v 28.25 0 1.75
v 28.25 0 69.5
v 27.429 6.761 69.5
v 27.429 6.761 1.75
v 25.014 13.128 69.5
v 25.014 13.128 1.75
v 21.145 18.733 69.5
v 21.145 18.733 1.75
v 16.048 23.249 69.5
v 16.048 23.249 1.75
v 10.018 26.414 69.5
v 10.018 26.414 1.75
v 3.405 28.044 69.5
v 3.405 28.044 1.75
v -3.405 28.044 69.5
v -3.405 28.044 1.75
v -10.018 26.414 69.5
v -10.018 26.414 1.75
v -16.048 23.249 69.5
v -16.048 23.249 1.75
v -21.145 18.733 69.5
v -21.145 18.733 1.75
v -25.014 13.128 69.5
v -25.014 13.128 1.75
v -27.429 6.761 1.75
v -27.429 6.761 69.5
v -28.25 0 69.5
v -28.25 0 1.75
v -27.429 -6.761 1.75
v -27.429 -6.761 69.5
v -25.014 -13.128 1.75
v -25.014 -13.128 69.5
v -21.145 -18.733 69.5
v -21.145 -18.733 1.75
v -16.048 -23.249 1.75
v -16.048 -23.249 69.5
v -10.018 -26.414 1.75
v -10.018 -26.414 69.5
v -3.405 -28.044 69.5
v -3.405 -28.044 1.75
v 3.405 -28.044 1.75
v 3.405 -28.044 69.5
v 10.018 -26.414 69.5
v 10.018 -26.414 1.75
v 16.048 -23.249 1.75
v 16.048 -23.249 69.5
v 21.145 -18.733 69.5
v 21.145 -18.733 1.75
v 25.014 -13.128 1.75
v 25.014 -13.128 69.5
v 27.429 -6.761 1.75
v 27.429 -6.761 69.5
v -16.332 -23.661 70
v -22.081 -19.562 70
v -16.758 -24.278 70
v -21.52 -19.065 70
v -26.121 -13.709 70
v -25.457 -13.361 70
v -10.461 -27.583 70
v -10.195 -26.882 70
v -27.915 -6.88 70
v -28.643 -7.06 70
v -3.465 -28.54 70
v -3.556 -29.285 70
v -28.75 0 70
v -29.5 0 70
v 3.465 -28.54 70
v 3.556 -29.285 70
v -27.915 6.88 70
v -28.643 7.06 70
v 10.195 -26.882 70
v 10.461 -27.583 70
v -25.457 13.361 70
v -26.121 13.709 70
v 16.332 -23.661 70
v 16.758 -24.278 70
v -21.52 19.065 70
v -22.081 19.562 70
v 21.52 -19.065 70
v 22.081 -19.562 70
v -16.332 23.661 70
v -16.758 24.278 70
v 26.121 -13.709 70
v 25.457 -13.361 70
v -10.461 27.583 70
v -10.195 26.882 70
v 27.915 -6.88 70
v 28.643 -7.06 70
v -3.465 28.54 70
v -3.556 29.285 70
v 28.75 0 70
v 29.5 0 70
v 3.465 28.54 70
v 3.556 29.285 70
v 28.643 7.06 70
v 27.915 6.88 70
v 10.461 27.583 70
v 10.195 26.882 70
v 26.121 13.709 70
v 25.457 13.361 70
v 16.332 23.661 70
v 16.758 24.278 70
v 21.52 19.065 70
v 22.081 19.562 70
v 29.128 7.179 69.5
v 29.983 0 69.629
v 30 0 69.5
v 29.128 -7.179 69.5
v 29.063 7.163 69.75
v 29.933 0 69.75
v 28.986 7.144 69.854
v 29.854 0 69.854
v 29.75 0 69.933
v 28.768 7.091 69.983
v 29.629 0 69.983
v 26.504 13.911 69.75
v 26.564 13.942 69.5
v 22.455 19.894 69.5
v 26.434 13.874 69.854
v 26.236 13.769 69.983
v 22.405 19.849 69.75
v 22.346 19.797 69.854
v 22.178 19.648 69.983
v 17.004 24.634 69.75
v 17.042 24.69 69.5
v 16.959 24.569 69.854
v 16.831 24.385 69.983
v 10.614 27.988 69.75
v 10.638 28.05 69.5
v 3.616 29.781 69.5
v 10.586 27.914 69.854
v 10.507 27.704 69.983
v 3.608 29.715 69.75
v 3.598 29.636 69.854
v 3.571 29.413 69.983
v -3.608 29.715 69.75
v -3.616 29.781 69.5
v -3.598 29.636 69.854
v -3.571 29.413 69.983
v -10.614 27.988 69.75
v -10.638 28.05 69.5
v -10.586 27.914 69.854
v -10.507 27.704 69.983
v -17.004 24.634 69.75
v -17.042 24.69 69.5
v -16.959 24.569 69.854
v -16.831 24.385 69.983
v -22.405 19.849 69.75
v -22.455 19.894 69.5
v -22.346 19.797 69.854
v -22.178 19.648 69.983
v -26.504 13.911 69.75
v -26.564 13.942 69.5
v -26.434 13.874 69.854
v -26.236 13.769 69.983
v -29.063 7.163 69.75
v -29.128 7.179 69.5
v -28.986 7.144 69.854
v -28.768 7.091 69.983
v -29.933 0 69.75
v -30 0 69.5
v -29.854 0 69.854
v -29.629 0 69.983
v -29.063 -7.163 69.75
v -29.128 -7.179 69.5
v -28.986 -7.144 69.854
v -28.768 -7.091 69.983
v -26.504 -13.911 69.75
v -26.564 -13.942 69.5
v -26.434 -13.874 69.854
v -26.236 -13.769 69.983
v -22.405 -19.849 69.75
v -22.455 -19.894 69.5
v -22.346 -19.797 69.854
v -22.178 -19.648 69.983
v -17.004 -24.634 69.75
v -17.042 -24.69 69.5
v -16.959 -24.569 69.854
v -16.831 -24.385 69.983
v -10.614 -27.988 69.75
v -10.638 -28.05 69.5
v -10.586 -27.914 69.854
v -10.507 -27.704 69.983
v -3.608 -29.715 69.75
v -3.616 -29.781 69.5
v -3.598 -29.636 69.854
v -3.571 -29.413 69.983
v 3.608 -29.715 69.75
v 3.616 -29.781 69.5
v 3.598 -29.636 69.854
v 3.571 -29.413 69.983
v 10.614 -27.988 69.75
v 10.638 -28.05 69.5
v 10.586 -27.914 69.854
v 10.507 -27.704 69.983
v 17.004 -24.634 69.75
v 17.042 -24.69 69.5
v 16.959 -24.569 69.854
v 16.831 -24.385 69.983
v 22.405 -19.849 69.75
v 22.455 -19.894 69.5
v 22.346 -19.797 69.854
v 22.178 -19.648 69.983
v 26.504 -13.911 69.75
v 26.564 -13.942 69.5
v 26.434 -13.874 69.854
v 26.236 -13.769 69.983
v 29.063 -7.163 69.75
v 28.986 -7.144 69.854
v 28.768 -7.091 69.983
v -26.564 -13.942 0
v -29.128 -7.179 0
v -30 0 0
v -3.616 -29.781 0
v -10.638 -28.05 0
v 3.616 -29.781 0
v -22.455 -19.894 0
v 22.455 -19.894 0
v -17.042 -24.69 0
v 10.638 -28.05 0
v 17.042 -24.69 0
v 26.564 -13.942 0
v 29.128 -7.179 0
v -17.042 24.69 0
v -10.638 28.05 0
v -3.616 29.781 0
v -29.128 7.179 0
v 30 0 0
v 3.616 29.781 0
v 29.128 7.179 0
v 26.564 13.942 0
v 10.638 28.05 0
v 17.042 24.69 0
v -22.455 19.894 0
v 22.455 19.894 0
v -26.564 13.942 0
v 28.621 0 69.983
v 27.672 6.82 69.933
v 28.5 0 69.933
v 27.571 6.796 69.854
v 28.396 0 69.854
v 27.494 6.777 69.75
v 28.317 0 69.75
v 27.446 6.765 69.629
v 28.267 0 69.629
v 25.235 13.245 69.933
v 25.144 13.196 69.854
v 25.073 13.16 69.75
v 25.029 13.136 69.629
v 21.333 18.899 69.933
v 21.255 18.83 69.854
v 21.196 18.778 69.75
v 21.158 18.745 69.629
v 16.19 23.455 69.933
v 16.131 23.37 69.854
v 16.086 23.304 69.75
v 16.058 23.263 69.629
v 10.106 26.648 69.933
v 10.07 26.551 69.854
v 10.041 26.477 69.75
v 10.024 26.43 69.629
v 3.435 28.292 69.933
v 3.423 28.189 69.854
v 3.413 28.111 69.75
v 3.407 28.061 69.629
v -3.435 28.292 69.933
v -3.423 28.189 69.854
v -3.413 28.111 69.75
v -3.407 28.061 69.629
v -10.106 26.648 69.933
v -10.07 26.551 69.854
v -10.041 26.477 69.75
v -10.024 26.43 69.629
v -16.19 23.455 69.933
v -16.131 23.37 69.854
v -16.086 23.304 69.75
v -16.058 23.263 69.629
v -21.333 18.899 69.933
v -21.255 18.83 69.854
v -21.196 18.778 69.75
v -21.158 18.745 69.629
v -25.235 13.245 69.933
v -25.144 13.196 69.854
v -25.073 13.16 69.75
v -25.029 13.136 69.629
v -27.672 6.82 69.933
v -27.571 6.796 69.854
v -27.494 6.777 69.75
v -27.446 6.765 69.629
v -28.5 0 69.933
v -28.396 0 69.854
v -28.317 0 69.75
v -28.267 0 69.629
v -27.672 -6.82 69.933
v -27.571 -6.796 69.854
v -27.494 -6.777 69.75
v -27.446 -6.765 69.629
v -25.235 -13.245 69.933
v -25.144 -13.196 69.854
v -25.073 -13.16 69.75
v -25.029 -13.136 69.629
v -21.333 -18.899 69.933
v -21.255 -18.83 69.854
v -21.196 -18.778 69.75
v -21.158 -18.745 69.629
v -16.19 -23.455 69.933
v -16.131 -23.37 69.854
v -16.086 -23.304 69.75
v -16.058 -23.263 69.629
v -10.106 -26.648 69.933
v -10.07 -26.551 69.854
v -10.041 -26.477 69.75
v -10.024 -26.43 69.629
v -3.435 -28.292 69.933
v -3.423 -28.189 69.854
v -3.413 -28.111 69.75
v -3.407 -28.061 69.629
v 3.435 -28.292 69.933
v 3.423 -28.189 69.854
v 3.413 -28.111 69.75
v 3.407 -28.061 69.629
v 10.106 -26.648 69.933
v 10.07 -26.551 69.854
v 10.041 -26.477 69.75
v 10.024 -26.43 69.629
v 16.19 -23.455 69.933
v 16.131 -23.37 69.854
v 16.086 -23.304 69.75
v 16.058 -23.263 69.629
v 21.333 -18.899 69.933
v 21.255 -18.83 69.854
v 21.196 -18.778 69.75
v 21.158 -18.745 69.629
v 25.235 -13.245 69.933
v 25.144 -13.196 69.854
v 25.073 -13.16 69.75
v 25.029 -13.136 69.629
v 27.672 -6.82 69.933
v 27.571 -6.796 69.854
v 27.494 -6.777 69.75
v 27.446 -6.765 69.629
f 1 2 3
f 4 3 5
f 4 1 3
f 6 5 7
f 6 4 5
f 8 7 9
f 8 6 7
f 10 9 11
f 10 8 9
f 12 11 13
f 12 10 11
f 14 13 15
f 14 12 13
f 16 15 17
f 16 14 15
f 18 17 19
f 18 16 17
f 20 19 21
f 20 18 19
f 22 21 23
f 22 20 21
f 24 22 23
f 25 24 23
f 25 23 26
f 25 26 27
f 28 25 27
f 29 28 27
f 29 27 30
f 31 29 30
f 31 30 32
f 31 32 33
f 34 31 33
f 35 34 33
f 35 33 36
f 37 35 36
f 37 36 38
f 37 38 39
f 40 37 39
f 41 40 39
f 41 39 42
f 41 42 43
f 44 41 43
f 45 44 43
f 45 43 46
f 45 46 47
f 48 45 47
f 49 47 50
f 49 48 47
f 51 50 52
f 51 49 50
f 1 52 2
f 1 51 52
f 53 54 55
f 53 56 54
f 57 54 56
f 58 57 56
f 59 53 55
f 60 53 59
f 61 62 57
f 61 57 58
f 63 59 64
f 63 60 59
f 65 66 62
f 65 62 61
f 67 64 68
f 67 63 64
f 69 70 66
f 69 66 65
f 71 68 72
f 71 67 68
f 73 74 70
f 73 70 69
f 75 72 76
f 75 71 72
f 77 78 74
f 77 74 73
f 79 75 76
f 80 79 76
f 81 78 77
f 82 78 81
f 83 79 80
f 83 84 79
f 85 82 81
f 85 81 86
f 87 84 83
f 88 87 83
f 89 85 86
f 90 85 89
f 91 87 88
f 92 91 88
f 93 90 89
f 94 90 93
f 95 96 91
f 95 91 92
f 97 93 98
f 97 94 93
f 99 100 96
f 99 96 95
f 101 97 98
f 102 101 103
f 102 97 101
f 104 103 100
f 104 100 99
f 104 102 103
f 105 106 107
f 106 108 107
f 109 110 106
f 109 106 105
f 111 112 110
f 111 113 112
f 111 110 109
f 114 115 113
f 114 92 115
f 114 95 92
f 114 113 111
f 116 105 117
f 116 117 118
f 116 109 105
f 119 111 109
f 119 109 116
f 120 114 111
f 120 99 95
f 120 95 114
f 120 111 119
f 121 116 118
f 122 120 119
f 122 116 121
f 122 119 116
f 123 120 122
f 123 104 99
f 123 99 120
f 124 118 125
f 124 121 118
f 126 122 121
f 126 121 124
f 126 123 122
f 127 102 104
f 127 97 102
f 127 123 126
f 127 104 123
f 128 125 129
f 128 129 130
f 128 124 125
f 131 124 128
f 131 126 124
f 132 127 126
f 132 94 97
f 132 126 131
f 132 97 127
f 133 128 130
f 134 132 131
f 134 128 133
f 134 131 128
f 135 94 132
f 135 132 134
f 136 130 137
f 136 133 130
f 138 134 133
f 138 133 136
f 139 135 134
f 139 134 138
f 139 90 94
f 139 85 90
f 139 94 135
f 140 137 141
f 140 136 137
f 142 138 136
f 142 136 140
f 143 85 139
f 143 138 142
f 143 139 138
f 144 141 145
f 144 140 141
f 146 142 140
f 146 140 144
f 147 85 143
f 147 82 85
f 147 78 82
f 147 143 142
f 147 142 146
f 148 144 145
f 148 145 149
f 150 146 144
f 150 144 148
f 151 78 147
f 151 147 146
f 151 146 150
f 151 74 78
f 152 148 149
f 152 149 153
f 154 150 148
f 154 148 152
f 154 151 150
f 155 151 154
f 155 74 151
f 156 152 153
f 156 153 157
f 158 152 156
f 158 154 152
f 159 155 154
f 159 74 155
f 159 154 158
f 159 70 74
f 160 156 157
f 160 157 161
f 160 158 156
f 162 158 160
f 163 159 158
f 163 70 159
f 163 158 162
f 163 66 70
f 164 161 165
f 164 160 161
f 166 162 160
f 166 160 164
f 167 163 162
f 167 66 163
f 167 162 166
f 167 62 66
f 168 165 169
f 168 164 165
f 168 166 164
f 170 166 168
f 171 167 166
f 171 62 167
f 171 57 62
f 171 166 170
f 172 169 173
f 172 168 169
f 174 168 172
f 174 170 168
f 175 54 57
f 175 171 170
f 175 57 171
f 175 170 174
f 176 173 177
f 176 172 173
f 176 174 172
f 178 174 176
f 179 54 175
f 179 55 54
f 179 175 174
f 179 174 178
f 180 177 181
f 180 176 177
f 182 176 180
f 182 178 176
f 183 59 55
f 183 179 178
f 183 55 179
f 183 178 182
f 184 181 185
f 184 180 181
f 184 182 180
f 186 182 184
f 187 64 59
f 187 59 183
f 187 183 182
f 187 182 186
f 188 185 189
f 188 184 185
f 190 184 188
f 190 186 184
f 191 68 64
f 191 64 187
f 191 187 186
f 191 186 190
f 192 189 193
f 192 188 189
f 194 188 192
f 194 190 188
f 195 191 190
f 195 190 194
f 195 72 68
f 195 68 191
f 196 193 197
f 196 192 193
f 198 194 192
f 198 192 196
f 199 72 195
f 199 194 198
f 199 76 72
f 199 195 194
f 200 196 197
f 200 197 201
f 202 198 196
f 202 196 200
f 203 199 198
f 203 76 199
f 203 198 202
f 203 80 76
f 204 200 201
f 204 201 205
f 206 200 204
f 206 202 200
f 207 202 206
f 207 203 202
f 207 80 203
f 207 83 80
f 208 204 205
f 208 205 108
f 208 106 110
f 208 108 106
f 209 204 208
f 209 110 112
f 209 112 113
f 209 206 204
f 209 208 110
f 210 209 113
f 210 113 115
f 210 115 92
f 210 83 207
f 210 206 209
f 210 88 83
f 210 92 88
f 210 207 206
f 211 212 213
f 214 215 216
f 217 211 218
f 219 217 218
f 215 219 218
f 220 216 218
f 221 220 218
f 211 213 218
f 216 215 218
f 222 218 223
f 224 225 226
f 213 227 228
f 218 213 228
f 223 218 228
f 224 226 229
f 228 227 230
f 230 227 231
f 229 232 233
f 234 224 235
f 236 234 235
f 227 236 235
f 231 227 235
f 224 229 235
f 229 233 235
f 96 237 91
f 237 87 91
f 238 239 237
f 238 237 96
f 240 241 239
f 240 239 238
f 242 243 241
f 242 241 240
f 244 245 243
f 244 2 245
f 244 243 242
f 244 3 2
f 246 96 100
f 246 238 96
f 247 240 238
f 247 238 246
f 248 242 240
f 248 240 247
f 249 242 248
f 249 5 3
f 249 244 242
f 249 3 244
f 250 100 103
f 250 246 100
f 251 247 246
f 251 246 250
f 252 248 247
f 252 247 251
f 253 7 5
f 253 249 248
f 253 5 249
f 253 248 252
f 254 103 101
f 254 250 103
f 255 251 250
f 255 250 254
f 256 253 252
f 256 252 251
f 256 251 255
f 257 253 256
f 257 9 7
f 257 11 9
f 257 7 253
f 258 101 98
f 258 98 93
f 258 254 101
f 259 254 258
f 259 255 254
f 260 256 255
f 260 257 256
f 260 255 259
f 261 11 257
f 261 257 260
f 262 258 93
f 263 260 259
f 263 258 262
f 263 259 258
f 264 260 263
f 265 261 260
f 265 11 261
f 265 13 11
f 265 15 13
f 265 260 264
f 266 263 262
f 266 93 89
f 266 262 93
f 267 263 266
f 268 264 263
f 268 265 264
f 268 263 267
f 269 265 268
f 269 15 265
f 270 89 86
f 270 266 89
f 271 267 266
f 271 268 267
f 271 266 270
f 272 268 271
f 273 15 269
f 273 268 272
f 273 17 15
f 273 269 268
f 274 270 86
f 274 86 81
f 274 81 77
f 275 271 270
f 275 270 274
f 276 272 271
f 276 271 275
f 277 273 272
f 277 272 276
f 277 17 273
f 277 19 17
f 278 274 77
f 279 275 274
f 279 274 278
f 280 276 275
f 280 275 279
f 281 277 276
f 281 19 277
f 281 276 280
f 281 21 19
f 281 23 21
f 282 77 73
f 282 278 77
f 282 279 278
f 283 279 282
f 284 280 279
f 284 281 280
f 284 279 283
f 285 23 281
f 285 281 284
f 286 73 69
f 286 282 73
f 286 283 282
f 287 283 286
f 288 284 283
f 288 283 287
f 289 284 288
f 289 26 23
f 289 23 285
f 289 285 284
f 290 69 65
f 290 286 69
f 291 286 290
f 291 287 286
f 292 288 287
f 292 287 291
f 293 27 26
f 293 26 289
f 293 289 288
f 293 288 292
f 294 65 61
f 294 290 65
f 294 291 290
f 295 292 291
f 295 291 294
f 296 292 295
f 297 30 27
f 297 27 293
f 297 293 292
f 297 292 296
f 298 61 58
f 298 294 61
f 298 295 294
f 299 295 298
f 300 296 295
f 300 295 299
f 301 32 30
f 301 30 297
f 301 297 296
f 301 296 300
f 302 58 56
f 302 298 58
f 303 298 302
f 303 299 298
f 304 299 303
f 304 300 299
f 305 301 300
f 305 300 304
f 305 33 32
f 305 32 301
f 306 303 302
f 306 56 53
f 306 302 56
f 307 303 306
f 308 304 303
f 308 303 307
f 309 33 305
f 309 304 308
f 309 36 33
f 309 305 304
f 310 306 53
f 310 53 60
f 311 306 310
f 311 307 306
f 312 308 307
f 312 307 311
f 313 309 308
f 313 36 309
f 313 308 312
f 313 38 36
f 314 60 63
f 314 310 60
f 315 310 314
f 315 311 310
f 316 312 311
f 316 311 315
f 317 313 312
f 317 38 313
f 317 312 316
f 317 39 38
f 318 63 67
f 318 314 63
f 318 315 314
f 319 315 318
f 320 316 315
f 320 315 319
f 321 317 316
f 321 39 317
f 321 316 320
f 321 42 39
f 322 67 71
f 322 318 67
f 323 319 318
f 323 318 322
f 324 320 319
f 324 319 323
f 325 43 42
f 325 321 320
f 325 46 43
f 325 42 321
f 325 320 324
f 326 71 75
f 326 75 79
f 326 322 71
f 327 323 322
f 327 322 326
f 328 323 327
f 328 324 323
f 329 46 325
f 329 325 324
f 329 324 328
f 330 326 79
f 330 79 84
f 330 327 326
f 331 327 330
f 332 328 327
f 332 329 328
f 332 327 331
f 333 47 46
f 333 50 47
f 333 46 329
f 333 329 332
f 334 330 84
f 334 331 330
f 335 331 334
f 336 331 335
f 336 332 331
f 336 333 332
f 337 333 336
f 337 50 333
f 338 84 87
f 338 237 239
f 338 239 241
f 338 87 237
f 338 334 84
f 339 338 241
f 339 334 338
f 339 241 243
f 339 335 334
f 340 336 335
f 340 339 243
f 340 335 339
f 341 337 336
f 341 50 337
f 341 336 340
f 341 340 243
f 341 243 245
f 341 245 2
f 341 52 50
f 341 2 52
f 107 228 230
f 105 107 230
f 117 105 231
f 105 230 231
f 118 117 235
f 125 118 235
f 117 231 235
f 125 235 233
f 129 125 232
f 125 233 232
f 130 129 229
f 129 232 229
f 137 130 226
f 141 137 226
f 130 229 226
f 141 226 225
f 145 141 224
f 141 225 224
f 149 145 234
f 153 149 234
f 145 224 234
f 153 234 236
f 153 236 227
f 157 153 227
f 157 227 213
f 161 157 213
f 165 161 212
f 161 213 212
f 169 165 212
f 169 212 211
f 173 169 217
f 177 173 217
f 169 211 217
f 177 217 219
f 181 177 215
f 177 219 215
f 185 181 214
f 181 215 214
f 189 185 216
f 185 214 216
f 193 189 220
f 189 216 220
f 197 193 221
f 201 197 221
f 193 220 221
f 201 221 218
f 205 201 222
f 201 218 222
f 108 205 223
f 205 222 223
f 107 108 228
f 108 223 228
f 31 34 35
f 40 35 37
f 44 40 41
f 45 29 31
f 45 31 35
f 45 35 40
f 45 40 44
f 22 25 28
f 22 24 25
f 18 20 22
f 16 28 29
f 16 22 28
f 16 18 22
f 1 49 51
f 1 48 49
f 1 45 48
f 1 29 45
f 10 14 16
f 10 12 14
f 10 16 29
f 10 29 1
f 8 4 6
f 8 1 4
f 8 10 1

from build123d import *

# Parameters (mm, degrees)
F0_R     = 30
F1_DEPTH = 70
F2_T     = -1.75
F3_R     = 0.5


with BuildPart() as f1:
    # F0 (on Top) → F1 (new body)
    with BuildSketch(Plane.XY):
        Circle(F0_R)
    extrude(amount=F1_DEPTH)

    # F2
    f2_openings = [f1.faces().sort_by_distance(p)[0] for p in [
        (0, 0, 70),
    ]]
    offset(amount=F2_T, openings=f2_openings)

    # F3
    f3_edges = [f1.edges().sort_by_distance(p)[0] for p in [
        (-30, 0, 70),
        (-28.25, 0, 70),
    ]]
    fillet(f3_edges, radius=F3_R)


solid = f1.part
